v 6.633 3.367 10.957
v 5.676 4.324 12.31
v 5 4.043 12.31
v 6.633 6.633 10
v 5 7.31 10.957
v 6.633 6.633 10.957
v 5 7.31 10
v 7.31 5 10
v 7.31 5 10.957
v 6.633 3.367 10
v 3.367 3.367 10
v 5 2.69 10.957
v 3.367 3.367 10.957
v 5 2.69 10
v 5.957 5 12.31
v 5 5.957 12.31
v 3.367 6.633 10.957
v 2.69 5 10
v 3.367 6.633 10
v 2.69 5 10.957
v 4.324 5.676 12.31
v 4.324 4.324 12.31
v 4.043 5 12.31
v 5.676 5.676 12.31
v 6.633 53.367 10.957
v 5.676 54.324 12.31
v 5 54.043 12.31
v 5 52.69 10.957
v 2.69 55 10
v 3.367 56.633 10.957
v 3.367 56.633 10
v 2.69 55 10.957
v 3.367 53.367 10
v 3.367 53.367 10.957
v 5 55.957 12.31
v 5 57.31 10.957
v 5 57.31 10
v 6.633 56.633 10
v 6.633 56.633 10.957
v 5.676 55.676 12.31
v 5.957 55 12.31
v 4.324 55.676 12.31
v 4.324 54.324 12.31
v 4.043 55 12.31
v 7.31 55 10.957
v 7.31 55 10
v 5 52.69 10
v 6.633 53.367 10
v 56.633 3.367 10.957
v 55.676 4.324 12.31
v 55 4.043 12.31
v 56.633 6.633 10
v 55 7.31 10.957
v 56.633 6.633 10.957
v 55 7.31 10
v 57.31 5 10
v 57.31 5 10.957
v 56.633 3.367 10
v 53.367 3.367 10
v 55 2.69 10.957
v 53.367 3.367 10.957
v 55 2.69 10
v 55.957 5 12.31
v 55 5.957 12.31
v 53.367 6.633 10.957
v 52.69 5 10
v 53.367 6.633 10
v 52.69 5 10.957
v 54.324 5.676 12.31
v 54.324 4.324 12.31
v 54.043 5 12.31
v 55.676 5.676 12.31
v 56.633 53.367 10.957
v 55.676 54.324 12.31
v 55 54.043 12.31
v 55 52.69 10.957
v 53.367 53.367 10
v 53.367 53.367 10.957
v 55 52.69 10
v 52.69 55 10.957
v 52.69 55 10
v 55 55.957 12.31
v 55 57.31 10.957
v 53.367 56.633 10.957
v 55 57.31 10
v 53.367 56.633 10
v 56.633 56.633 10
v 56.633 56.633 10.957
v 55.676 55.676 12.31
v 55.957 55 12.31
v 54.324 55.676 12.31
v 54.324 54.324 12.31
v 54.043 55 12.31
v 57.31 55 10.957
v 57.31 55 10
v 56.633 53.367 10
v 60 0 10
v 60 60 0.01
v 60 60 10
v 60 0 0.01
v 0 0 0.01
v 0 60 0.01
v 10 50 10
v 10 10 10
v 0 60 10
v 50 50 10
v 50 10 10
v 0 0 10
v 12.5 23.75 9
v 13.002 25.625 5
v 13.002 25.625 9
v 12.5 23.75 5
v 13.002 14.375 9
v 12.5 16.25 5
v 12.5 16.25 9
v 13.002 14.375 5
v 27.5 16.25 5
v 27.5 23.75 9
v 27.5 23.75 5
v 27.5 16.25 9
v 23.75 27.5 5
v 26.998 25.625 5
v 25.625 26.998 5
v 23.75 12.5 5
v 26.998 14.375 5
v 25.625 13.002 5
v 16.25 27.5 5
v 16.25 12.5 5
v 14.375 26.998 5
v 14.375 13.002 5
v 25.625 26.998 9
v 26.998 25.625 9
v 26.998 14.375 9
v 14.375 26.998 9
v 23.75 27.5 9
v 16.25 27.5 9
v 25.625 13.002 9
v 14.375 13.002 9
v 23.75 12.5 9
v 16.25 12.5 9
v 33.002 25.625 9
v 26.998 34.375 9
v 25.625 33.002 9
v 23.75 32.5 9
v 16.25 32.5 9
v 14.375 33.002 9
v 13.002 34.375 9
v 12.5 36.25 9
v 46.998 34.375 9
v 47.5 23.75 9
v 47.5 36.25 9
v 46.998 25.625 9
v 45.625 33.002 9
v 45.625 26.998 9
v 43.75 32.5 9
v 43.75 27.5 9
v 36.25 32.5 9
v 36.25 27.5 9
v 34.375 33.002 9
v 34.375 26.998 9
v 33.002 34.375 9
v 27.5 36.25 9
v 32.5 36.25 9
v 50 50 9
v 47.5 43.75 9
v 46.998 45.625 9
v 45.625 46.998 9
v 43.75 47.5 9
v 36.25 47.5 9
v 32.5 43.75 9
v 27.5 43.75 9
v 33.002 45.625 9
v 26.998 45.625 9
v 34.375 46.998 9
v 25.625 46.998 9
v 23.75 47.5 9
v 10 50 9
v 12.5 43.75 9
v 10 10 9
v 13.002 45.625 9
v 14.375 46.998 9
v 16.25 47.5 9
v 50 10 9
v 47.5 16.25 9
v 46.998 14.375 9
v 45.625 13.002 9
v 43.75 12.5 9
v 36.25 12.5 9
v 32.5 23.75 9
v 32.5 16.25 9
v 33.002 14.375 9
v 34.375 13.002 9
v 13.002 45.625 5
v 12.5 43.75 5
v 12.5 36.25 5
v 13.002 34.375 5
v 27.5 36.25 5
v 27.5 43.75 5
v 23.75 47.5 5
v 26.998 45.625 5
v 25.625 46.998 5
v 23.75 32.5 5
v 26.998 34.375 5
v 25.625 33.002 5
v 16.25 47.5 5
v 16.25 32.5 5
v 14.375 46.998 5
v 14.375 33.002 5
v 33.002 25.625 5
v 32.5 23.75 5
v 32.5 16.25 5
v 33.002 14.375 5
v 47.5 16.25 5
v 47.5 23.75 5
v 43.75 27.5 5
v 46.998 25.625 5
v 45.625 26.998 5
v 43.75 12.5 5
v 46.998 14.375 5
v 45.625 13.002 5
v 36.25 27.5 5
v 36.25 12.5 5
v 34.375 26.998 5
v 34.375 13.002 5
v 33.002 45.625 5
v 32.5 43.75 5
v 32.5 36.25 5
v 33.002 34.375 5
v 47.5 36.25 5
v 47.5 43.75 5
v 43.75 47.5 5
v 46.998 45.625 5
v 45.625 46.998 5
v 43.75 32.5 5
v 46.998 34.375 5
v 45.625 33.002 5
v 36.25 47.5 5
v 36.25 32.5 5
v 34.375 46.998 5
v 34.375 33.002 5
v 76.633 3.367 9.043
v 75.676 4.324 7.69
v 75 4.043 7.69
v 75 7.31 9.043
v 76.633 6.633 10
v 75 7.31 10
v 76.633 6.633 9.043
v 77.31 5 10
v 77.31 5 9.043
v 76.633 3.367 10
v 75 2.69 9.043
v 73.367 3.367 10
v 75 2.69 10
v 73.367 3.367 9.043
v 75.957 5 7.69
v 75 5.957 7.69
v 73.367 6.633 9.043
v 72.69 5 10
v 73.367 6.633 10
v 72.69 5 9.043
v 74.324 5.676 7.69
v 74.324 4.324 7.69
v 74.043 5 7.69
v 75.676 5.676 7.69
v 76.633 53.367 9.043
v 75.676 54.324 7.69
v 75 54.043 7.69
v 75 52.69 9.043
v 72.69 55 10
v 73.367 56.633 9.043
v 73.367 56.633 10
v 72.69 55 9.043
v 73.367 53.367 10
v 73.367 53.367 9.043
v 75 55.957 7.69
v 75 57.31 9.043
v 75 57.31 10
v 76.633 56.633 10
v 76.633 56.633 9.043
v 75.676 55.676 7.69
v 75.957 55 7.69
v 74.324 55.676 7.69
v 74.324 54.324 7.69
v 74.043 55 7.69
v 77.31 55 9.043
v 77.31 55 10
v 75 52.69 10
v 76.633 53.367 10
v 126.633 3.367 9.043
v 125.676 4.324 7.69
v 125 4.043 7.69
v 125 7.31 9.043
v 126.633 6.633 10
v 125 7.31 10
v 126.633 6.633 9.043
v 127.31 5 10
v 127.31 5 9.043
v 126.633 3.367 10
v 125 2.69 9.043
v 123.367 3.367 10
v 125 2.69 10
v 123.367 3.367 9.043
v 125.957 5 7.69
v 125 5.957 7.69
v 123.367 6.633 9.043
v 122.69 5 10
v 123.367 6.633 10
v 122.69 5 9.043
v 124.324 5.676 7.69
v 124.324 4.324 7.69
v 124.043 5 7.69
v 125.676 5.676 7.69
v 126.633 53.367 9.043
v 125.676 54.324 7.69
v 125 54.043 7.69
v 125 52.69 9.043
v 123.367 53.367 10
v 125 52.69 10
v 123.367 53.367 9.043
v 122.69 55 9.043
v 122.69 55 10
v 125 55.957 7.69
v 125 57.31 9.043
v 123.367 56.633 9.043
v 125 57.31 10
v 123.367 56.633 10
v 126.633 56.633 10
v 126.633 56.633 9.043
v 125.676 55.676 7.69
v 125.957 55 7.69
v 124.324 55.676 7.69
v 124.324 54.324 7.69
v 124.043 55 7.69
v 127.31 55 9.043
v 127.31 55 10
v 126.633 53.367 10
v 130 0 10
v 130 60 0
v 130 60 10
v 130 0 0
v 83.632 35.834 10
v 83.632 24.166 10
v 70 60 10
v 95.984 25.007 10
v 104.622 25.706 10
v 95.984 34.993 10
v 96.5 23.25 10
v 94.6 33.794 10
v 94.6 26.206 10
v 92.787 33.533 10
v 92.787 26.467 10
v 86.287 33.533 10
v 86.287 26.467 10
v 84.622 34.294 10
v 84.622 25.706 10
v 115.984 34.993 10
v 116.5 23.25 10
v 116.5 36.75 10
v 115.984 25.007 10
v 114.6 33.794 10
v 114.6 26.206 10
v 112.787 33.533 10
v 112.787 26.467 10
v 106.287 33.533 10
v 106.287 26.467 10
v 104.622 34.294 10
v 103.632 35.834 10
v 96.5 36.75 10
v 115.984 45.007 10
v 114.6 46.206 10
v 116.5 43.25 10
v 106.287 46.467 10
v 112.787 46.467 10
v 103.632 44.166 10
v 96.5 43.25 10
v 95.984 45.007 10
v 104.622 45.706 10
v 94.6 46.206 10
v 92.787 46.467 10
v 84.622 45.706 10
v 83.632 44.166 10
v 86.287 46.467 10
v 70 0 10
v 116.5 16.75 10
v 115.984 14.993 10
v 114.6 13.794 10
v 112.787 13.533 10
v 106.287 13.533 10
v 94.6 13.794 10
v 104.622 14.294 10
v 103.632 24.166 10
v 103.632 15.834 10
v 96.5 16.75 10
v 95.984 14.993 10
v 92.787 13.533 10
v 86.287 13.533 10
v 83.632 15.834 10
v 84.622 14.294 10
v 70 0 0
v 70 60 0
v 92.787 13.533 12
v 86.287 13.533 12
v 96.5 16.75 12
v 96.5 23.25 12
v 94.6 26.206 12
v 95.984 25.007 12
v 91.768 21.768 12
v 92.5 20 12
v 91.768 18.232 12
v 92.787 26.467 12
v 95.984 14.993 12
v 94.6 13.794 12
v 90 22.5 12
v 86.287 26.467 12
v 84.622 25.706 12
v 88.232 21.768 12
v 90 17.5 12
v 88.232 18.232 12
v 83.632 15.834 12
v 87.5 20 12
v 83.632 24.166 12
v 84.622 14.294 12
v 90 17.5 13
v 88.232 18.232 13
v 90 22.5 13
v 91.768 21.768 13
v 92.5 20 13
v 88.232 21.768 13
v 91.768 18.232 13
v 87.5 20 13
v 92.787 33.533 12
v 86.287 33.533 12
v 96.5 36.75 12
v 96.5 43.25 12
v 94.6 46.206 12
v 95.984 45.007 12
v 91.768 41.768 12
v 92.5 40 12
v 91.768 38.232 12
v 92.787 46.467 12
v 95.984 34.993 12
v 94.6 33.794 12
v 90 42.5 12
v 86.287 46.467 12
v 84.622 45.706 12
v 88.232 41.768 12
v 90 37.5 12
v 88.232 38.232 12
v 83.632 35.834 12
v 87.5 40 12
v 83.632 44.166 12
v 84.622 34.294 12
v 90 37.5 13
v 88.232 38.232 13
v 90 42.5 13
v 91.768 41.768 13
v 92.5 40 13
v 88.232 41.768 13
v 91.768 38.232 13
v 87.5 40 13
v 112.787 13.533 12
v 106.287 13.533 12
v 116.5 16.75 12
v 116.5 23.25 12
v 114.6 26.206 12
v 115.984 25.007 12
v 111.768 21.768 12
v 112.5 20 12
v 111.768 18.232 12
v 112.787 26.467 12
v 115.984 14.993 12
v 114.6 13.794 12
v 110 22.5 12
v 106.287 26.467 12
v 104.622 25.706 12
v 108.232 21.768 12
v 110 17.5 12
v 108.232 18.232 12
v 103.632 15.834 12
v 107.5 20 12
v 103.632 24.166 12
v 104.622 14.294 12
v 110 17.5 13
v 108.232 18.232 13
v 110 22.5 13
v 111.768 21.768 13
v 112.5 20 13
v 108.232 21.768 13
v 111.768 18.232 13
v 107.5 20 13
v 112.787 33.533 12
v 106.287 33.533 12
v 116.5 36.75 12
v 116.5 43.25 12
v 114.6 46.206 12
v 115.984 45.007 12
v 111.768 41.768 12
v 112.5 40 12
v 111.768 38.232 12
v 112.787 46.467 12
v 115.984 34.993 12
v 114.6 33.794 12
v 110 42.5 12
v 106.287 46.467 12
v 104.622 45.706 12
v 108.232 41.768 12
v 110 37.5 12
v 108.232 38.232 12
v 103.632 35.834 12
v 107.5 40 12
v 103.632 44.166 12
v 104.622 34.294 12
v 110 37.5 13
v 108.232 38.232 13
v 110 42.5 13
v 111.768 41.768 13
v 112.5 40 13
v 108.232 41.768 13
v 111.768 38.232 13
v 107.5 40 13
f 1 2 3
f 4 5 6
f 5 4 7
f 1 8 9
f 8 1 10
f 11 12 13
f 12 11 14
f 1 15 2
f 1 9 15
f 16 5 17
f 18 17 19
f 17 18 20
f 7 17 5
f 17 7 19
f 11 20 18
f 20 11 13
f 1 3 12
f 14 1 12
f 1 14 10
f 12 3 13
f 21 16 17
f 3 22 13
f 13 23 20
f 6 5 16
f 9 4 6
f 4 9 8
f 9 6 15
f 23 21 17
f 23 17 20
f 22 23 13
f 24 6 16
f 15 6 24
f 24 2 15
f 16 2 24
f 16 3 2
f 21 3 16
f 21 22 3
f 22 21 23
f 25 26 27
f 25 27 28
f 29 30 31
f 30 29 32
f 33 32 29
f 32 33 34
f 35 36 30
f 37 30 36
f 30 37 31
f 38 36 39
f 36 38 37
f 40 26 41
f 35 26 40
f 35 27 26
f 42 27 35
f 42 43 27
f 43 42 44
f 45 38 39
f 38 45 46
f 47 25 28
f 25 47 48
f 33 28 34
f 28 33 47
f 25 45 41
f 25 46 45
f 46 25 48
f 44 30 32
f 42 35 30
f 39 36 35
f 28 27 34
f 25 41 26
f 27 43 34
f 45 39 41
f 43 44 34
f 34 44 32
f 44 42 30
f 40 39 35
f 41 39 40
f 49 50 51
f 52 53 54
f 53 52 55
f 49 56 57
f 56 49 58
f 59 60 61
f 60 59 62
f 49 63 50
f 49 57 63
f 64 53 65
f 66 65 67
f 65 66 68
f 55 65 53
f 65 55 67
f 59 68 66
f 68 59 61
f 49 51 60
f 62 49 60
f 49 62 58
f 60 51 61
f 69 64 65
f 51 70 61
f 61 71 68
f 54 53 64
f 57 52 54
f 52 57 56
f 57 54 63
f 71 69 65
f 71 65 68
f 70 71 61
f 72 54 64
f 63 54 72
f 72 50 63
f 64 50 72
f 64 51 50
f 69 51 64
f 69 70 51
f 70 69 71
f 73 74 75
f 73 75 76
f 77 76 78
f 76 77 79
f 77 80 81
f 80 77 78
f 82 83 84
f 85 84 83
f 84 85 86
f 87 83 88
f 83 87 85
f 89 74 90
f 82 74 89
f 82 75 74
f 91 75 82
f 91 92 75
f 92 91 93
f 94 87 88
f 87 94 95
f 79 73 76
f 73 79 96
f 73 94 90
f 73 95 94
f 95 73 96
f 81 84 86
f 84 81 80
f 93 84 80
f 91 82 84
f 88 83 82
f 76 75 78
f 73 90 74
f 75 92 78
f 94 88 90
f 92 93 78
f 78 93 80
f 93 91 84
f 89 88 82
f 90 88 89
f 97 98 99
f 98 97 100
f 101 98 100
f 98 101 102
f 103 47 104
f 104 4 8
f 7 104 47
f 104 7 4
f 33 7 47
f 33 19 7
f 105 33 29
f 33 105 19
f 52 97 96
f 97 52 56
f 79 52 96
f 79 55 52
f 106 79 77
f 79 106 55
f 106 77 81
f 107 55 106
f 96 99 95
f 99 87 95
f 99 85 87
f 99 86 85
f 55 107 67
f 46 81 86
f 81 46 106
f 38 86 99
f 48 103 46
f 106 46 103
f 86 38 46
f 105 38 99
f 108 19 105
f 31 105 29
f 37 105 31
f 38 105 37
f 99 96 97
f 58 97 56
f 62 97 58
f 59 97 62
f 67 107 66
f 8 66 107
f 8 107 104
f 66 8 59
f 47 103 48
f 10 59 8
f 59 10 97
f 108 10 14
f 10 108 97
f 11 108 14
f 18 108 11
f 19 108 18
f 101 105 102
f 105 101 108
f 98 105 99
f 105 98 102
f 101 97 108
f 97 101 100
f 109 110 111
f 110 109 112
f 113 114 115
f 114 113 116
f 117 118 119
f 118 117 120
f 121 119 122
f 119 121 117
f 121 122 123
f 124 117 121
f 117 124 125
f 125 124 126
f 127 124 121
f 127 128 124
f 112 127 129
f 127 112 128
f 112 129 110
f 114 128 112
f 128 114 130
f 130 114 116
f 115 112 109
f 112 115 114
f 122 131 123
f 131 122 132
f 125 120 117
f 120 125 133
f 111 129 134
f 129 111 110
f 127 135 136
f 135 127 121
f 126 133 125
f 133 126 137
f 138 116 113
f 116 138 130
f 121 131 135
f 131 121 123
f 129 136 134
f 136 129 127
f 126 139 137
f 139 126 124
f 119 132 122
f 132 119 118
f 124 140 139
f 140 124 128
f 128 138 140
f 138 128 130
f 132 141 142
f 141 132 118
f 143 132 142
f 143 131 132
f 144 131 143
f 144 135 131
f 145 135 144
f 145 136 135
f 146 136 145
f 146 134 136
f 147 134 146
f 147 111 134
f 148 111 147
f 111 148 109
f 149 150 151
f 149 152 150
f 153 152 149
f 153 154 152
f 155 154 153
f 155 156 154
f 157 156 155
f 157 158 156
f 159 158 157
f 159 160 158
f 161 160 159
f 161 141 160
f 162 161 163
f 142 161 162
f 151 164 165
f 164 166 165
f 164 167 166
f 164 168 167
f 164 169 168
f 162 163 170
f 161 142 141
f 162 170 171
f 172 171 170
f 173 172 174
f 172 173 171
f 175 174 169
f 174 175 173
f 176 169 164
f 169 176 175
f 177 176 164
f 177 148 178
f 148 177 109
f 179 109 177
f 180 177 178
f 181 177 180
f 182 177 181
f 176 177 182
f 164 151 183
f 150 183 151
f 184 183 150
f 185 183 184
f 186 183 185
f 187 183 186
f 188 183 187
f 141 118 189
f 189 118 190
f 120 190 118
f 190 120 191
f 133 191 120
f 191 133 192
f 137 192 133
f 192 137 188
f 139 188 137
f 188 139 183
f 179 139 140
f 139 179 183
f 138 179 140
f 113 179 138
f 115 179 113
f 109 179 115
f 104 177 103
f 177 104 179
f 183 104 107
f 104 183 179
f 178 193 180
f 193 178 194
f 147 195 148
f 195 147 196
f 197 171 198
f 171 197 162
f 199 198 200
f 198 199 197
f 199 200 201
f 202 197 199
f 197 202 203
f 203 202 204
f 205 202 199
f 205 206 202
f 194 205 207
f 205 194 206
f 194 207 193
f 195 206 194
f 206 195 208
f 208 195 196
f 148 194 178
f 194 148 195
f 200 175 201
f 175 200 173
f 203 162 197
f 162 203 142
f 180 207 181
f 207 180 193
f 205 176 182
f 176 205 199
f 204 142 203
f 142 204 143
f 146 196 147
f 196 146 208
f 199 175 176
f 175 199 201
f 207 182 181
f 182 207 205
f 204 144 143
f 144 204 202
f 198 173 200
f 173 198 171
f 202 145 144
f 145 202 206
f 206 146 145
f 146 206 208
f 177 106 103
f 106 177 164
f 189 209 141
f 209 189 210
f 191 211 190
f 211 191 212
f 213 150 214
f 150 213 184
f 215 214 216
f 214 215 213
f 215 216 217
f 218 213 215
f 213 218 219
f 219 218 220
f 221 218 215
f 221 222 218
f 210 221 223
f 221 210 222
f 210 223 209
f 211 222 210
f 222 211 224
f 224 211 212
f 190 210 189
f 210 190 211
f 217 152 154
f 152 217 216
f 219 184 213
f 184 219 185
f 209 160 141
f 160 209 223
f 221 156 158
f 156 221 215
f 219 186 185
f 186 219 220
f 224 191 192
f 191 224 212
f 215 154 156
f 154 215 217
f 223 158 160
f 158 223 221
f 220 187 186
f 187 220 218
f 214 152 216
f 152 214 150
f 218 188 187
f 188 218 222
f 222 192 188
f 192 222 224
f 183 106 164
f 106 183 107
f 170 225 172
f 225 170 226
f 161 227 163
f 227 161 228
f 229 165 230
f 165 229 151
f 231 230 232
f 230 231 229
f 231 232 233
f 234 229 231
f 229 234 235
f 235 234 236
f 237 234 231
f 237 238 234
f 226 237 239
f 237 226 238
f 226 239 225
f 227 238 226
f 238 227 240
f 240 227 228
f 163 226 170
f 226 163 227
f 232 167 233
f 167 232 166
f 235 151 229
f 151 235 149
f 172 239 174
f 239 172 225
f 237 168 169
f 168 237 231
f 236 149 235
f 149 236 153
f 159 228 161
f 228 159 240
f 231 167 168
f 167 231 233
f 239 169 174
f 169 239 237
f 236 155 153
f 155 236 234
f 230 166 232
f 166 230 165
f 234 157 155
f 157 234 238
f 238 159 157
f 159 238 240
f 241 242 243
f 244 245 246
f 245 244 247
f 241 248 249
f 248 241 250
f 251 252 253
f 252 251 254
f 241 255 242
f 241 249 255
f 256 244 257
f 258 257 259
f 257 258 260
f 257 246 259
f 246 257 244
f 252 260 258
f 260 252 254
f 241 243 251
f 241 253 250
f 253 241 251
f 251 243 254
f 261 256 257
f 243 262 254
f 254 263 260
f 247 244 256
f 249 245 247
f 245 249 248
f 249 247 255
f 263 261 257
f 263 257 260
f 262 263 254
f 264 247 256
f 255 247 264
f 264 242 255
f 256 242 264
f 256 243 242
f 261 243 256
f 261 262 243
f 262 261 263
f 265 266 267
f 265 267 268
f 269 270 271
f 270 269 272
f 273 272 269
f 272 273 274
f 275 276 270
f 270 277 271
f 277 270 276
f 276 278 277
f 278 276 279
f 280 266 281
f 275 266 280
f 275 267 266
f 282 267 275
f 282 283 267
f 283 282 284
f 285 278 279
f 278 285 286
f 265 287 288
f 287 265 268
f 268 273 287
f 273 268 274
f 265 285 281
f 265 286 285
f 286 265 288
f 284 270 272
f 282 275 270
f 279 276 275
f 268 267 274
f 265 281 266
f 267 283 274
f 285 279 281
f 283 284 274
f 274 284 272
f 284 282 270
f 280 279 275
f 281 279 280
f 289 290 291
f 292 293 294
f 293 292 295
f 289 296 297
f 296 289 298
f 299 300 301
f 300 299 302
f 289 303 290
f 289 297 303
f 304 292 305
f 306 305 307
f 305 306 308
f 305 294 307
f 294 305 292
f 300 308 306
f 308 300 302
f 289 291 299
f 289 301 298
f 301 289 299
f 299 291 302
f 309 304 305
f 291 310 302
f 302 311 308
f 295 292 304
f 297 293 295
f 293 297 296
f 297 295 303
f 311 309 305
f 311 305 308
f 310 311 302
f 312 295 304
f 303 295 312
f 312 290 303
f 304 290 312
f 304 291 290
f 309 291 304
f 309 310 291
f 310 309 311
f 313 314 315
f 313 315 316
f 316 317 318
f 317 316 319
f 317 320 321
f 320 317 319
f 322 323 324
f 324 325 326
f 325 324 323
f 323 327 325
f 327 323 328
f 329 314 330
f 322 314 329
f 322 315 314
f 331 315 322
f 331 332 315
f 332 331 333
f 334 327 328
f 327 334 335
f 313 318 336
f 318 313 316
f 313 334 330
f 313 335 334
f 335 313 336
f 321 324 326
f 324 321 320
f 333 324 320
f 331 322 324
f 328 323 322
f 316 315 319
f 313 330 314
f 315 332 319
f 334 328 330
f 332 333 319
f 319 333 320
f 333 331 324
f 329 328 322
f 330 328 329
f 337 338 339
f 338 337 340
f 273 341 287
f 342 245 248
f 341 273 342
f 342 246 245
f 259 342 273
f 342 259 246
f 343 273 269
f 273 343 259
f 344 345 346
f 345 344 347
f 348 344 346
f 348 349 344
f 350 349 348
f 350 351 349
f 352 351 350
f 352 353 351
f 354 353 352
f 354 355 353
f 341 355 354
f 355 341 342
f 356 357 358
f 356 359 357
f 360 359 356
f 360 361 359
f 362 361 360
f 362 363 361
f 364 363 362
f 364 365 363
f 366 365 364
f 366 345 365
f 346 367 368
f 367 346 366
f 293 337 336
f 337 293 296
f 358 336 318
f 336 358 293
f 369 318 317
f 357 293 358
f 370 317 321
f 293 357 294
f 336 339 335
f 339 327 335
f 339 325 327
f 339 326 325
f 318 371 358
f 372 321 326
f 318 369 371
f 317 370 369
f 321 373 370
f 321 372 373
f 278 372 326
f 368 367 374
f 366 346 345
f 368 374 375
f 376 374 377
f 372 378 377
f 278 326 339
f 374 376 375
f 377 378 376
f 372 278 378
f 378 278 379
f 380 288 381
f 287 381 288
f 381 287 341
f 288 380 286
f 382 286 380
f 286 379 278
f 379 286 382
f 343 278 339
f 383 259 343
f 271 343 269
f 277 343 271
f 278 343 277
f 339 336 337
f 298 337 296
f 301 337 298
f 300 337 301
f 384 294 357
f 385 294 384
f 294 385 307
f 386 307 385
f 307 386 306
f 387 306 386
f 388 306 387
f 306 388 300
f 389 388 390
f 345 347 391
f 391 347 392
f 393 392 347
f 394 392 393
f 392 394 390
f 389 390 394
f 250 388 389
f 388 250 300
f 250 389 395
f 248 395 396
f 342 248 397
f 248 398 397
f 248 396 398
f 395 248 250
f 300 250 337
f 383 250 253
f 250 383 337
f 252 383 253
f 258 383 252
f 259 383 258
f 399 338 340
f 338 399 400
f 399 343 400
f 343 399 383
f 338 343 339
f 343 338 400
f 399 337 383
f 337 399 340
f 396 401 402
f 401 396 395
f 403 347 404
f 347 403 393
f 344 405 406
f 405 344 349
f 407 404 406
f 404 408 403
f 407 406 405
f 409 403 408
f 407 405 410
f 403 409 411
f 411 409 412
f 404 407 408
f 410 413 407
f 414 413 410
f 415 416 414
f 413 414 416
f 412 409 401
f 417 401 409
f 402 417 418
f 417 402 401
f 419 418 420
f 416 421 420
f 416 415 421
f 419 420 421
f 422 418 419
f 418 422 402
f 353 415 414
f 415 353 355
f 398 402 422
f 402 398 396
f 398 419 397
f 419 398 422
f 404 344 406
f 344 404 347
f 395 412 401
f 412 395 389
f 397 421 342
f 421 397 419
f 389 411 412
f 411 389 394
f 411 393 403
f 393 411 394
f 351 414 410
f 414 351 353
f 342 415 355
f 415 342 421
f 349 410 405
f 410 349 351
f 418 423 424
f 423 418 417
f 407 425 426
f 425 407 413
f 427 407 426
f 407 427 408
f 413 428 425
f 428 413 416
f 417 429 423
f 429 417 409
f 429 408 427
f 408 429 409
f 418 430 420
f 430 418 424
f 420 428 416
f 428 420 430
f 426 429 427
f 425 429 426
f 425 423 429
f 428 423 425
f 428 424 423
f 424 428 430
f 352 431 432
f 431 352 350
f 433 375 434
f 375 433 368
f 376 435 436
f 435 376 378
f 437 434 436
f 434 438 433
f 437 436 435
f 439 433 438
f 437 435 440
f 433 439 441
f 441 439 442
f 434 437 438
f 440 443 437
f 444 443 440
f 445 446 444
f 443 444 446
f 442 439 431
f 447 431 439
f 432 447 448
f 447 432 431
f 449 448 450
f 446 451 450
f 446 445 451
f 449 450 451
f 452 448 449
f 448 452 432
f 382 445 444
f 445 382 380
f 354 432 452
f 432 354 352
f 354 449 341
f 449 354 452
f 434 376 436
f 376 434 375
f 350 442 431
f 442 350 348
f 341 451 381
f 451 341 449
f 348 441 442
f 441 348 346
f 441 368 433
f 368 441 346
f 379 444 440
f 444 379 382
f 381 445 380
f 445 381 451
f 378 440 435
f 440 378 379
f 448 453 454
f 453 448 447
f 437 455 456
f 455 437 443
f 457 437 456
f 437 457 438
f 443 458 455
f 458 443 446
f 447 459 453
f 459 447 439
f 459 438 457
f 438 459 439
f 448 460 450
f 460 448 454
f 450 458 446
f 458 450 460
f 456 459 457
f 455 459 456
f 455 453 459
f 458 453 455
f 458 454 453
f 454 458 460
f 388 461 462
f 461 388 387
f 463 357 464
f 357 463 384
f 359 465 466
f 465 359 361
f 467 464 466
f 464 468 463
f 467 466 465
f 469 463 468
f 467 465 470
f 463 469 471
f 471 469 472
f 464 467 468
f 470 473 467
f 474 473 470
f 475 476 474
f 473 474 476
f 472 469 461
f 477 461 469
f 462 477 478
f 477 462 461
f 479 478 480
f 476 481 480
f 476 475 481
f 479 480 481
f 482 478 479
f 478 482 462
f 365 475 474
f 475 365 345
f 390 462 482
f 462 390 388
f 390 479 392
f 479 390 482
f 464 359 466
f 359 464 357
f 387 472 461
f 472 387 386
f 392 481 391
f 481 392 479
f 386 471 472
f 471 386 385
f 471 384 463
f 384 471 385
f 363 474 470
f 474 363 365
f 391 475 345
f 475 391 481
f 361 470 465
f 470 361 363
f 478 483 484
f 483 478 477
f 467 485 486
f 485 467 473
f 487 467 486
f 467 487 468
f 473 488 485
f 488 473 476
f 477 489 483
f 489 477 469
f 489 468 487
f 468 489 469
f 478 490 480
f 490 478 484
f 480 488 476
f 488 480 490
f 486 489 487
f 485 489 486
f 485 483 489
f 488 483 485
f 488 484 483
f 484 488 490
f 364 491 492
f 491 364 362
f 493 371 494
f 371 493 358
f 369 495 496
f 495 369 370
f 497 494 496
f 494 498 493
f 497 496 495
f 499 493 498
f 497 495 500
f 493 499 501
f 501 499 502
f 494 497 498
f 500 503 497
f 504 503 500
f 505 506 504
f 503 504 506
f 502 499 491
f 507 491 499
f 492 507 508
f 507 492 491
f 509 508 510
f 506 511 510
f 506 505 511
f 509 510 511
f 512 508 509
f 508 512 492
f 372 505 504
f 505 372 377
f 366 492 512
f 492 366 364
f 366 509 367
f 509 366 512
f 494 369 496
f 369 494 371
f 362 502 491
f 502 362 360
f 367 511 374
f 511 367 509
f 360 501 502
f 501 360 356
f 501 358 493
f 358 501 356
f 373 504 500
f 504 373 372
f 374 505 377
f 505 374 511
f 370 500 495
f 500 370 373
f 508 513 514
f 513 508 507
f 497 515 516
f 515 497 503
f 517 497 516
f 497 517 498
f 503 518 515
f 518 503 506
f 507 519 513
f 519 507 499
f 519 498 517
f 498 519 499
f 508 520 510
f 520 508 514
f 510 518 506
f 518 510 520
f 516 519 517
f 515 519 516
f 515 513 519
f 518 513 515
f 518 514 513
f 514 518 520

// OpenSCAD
sizex=2;
sizey=2;

module button(h,s){
	translate([s/4,s/4,0])
	minkowski(){
		cube([s/2,s/2,h/2]);
		cylinder(r=s/4,h=h/2);
	}
}
module buttonunit(){
	translate([2.5,2.5,0]) button(5,15);
	cube([20,20,1]);
}
module buttoninside(){
	intersection(){
		translate([2.5,2.5]) button(5,15);
		union(){
			translate([1+2.5,1+2.5,-3]) button(5,13);
			translate([10,10,0]) cylinder(r=5/2,h=5-2);
		}
	}
}
module buttonpad(sizex,sizey,i=false){
	for(x=[0:sizex-1]) for(y=[0:sizey-1]){
		translate([20*x,20*y,0]){
			if(i) buttoninside();
			else buttonunit();
		}
	}
}
module nubs(sizex,sizey){
	translate([5,5,0])
	for(x=[0:1]) for(y=[0:1])
	translate([(20*sizex+10)*x,(20*sizey+10)*y])
	sphere(r=5/2);
}

mirror([0,0,1]) translate([0,0,-10])
difference(){
	union(){
		cube([20*sizex+20,20*sizey+20,9.99]);
		translate() nubs(sizex,sizey);
	}
	translate([10,10,0]) buttonpad(sizex,sizey);
}
translate([20*sizex+20+10,0,0])
union(){
	difference(){
		cube([20*sizex+20,20*sizey+20,10]);
		translate([0,0,10]) nubs(sizex,sizey);
	}
	translate([10,10,10]) buttonpad(2,2,true);
}
